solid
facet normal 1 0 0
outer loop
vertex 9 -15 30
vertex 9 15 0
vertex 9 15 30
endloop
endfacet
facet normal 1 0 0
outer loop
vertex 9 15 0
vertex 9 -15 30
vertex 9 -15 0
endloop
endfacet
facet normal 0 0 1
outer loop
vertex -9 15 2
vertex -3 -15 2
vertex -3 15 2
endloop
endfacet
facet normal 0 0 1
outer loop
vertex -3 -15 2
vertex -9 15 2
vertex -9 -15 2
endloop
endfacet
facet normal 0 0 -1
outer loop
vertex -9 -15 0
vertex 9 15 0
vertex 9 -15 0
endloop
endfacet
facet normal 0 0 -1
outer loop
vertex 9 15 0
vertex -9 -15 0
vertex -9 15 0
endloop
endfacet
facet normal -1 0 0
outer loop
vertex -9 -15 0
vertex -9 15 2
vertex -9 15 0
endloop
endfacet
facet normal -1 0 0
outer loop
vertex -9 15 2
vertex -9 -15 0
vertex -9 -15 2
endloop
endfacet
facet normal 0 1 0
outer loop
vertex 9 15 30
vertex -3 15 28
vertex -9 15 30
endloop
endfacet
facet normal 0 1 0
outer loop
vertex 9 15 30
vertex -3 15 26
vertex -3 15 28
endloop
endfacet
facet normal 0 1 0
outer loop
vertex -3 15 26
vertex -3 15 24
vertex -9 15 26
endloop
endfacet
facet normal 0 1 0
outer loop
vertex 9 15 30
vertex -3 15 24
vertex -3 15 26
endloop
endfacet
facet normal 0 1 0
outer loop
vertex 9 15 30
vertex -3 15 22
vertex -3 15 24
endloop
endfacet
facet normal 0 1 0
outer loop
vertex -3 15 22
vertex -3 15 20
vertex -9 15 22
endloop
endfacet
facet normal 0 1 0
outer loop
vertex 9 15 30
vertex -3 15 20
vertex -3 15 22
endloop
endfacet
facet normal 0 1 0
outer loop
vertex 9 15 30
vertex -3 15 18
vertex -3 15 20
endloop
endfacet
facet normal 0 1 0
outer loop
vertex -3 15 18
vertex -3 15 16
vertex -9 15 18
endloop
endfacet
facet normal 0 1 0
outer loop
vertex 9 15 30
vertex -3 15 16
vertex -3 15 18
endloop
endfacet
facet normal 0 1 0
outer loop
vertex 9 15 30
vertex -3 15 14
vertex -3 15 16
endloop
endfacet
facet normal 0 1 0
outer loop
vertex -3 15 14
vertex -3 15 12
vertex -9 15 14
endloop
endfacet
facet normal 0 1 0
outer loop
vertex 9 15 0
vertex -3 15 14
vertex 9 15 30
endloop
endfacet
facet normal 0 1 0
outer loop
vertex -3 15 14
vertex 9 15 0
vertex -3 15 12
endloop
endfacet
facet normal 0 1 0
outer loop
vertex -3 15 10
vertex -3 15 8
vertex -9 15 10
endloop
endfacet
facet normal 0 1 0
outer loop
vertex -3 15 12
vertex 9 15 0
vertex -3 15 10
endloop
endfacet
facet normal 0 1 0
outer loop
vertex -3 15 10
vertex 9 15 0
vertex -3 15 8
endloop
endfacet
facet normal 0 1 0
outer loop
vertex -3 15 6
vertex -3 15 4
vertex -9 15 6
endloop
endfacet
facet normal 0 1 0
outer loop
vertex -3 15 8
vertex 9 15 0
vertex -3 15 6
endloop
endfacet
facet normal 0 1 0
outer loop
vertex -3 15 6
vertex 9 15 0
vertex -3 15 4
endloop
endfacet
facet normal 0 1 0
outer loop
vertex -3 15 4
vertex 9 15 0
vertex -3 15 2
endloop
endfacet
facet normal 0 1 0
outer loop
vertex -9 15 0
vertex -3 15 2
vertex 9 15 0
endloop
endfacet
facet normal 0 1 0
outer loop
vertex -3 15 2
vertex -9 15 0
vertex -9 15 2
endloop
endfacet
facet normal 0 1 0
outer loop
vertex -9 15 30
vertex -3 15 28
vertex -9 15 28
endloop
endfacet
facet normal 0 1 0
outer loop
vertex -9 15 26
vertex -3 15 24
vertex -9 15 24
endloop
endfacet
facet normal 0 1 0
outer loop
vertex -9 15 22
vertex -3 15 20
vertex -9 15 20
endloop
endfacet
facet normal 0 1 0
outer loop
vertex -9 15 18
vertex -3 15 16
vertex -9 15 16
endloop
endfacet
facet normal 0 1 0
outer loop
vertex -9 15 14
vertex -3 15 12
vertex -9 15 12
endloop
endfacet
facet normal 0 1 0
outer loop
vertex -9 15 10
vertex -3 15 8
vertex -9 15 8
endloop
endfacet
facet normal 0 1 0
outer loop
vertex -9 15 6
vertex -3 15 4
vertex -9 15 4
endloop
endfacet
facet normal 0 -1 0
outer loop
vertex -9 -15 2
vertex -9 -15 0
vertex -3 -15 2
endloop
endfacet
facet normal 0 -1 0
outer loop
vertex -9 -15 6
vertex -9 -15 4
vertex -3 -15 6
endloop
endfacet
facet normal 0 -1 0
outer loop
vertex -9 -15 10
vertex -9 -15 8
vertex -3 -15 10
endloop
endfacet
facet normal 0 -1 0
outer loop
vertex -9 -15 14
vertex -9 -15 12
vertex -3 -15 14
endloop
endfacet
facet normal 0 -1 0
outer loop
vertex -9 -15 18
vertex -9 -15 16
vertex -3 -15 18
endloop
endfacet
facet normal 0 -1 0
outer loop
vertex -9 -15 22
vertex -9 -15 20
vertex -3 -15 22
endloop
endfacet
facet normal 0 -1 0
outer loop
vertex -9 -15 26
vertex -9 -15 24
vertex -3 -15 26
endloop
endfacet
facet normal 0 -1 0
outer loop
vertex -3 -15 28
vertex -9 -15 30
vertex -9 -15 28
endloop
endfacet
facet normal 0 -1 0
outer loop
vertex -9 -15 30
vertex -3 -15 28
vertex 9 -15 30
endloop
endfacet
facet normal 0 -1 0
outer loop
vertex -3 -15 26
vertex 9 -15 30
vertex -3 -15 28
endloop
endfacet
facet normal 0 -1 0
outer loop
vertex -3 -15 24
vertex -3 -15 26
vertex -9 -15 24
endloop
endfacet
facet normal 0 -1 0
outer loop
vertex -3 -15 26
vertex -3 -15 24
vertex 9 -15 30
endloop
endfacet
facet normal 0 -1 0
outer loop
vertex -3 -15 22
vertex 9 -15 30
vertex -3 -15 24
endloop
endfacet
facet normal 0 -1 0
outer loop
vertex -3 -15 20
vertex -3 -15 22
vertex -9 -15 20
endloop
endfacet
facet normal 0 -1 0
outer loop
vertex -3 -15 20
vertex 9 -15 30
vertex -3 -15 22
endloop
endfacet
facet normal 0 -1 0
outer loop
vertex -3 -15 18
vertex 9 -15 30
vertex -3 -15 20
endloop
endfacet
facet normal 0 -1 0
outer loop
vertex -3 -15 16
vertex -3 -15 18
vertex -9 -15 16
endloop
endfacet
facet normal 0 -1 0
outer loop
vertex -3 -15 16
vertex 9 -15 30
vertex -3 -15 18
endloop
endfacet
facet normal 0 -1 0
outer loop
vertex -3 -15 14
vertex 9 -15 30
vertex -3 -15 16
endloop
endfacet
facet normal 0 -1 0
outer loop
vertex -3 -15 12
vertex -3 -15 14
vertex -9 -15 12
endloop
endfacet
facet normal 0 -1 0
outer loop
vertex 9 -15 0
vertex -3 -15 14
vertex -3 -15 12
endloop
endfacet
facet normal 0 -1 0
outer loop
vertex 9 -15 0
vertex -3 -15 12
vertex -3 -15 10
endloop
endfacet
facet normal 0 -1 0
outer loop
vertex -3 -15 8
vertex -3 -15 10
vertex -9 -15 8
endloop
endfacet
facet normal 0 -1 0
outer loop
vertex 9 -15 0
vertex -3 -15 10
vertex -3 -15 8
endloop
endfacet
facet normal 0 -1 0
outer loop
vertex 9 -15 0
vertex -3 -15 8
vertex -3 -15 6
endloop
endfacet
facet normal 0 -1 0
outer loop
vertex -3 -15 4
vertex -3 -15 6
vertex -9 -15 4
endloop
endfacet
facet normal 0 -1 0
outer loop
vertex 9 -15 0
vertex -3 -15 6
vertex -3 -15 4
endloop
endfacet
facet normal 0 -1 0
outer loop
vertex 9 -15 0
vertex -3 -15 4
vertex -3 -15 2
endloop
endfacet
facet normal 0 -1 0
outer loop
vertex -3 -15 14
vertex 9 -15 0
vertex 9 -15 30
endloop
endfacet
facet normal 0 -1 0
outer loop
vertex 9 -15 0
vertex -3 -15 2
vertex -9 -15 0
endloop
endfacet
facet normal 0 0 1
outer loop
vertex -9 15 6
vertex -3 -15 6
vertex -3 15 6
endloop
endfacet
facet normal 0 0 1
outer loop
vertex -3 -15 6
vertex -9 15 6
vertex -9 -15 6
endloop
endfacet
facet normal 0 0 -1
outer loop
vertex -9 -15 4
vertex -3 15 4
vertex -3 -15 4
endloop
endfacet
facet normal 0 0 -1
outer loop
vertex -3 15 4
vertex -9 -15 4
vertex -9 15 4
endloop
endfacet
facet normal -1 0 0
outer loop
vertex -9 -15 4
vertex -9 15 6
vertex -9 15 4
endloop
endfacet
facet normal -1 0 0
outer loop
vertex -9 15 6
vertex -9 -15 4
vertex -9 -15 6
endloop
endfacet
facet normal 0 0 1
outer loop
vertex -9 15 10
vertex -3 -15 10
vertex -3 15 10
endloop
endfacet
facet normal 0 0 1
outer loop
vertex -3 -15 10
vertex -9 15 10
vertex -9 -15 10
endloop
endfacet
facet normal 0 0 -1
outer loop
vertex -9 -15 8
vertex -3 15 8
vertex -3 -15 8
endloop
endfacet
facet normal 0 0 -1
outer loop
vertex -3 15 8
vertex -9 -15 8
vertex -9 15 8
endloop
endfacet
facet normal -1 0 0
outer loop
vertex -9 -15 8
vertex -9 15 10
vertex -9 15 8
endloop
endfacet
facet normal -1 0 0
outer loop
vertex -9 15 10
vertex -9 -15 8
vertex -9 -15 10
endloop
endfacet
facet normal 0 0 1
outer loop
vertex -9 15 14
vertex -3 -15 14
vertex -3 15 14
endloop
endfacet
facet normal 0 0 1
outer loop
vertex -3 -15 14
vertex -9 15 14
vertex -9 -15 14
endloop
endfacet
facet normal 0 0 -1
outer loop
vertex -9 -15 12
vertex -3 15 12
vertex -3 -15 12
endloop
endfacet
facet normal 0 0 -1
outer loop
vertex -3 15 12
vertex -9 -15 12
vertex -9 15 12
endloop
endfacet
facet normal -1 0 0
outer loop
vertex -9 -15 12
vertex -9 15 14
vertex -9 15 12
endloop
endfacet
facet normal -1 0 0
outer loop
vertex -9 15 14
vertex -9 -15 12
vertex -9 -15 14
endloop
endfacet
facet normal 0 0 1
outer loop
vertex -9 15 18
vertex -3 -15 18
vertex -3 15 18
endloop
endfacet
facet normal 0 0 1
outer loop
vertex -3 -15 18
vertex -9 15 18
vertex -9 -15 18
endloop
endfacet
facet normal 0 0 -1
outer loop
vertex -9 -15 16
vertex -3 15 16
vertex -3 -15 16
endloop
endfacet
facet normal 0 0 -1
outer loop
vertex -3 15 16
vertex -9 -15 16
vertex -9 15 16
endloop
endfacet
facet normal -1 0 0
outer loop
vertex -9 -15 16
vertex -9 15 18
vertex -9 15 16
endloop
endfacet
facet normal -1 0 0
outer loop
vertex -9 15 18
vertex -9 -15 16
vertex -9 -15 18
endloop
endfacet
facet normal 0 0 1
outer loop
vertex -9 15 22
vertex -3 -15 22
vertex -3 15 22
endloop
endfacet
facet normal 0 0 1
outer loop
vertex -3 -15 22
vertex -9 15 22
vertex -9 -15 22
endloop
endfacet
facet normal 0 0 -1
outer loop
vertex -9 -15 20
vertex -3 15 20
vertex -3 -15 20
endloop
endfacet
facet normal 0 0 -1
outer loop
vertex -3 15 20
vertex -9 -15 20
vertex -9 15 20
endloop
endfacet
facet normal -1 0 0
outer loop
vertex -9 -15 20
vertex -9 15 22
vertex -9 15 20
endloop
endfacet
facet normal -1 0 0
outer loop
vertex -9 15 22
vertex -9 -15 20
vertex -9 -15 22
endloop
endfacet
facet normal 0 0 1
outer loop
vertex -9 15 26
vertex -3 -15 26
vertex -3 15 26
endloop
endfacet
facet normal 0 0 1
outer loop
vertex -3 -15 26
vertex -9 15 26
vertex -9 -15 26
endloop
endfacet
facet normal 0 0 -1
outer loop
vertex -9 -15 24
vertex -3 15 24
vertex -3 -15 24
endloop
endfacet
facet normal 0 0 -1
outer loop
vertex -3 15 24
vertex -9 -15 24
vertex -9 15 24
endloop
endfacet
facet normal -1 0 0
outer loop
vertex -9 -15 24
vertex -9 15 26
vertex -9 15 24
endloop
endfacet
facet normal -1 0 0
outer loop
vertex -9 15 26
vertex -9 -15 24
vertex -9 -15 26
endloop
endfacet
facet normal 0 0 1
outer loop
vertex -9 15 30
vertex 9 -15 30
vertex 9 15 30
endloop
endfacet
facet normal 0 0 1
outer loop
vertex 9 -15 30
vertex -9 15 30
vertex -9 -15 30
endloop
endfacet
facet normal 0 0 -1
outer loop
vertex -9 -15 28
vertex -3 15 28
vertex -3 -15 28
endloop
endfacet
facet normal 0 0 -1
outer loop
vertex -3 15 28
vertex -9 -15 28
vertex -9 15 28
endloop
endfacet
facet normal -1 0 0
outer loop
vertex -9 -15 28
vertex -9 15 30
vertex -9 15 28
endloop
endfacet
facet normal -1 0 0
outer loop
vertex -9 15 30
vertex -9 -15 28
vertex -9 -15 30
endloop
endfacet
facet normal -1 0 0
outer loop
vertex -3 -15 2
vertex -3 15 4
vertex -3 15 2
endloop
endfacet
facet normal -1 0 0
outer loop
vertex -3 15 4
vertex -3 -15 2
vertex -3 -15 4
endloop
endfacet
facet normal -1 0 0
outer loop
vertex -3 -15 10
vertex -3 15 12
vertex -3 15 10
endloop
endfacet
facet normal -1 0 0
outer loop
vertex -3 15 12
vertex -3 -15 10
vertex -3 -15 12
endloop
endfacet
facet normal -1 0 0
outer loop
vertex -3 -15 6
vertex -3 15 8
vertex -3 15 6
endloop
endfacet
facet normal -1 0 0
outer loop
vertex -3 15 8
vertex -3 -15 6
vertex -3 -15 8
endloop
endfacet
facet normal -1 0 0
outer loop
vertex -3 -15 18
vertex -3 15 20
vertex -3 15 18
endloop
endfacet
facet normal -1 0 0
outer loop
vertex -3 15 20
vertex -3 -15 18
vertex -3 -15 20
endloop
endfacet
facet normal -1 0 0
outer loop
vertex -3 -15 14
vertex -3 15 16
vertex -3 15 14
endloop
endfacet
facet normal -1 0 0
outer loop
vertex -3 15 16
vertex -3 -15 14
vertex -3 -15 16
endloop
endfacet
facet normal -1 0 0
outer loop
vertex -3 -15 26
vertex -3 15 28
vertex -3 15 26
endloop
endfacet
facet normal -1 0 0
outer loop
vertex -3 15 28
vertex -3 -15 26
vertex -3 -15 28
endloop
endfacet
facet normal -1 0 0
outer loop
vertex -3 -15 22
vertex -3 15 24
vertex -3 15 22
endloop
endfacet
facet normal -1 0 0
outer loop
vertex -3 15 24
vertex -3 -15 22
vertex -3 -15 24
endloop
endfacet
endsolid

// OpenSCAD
number_of_fins = 8;
number_of_gaps = 7;
block_height =  30;
fin_depth = 6; 
block_and_fin_depth = 18; 
block_depth = block_and_fin_depth - fin_depth;
block_width = 30;

fin_and_space_pair_height = 2 * block_height / (number_of_fins + number_of_gaps);
distance_between_fins = fin_and_space_pair_height / 2;
fin_height = distance_between_fins;

module heatsink(){

    
    union(){
        color([1,1,1]){
            translate([0, 0, fin_height / 2]){
                for (fin_no = [0:number_of_fins - 1]){
                    translate([0,0,fin_and_space_pair_height * fin_no]){
                        cube([block_and_fin_depth, block_width, fin_height], center=true);
                    }  
                }
            }
            translate([(block_depth / 2) - (fin_depth / 2), 0, block_height / 2]){
                cube([block_depth, block_width, block_height], center = true);
            }
        }
    }
}

module heatsink_side_2d(){
    linear_extrude(1)
    projection(){
        translate([0, 0, 1]){
            rotate([90, 0, 0]){
                translate([0 , (30 - 2) / 2 , 0])
                {
                    heatsink();
                }
            }
        }
    }
}

module heatsink_bottom_2d(){
    // really this should come from the completed thing, but this is so simple and just a sanity check i'll type it in here
    cube([block_and_fin_depth, block_width, 2]);
}


heatsink();

/*
heatsink_side_2d();
translate([30 / 2 , -30, 0]){
    heatsink_bottom_2d();
}*/
